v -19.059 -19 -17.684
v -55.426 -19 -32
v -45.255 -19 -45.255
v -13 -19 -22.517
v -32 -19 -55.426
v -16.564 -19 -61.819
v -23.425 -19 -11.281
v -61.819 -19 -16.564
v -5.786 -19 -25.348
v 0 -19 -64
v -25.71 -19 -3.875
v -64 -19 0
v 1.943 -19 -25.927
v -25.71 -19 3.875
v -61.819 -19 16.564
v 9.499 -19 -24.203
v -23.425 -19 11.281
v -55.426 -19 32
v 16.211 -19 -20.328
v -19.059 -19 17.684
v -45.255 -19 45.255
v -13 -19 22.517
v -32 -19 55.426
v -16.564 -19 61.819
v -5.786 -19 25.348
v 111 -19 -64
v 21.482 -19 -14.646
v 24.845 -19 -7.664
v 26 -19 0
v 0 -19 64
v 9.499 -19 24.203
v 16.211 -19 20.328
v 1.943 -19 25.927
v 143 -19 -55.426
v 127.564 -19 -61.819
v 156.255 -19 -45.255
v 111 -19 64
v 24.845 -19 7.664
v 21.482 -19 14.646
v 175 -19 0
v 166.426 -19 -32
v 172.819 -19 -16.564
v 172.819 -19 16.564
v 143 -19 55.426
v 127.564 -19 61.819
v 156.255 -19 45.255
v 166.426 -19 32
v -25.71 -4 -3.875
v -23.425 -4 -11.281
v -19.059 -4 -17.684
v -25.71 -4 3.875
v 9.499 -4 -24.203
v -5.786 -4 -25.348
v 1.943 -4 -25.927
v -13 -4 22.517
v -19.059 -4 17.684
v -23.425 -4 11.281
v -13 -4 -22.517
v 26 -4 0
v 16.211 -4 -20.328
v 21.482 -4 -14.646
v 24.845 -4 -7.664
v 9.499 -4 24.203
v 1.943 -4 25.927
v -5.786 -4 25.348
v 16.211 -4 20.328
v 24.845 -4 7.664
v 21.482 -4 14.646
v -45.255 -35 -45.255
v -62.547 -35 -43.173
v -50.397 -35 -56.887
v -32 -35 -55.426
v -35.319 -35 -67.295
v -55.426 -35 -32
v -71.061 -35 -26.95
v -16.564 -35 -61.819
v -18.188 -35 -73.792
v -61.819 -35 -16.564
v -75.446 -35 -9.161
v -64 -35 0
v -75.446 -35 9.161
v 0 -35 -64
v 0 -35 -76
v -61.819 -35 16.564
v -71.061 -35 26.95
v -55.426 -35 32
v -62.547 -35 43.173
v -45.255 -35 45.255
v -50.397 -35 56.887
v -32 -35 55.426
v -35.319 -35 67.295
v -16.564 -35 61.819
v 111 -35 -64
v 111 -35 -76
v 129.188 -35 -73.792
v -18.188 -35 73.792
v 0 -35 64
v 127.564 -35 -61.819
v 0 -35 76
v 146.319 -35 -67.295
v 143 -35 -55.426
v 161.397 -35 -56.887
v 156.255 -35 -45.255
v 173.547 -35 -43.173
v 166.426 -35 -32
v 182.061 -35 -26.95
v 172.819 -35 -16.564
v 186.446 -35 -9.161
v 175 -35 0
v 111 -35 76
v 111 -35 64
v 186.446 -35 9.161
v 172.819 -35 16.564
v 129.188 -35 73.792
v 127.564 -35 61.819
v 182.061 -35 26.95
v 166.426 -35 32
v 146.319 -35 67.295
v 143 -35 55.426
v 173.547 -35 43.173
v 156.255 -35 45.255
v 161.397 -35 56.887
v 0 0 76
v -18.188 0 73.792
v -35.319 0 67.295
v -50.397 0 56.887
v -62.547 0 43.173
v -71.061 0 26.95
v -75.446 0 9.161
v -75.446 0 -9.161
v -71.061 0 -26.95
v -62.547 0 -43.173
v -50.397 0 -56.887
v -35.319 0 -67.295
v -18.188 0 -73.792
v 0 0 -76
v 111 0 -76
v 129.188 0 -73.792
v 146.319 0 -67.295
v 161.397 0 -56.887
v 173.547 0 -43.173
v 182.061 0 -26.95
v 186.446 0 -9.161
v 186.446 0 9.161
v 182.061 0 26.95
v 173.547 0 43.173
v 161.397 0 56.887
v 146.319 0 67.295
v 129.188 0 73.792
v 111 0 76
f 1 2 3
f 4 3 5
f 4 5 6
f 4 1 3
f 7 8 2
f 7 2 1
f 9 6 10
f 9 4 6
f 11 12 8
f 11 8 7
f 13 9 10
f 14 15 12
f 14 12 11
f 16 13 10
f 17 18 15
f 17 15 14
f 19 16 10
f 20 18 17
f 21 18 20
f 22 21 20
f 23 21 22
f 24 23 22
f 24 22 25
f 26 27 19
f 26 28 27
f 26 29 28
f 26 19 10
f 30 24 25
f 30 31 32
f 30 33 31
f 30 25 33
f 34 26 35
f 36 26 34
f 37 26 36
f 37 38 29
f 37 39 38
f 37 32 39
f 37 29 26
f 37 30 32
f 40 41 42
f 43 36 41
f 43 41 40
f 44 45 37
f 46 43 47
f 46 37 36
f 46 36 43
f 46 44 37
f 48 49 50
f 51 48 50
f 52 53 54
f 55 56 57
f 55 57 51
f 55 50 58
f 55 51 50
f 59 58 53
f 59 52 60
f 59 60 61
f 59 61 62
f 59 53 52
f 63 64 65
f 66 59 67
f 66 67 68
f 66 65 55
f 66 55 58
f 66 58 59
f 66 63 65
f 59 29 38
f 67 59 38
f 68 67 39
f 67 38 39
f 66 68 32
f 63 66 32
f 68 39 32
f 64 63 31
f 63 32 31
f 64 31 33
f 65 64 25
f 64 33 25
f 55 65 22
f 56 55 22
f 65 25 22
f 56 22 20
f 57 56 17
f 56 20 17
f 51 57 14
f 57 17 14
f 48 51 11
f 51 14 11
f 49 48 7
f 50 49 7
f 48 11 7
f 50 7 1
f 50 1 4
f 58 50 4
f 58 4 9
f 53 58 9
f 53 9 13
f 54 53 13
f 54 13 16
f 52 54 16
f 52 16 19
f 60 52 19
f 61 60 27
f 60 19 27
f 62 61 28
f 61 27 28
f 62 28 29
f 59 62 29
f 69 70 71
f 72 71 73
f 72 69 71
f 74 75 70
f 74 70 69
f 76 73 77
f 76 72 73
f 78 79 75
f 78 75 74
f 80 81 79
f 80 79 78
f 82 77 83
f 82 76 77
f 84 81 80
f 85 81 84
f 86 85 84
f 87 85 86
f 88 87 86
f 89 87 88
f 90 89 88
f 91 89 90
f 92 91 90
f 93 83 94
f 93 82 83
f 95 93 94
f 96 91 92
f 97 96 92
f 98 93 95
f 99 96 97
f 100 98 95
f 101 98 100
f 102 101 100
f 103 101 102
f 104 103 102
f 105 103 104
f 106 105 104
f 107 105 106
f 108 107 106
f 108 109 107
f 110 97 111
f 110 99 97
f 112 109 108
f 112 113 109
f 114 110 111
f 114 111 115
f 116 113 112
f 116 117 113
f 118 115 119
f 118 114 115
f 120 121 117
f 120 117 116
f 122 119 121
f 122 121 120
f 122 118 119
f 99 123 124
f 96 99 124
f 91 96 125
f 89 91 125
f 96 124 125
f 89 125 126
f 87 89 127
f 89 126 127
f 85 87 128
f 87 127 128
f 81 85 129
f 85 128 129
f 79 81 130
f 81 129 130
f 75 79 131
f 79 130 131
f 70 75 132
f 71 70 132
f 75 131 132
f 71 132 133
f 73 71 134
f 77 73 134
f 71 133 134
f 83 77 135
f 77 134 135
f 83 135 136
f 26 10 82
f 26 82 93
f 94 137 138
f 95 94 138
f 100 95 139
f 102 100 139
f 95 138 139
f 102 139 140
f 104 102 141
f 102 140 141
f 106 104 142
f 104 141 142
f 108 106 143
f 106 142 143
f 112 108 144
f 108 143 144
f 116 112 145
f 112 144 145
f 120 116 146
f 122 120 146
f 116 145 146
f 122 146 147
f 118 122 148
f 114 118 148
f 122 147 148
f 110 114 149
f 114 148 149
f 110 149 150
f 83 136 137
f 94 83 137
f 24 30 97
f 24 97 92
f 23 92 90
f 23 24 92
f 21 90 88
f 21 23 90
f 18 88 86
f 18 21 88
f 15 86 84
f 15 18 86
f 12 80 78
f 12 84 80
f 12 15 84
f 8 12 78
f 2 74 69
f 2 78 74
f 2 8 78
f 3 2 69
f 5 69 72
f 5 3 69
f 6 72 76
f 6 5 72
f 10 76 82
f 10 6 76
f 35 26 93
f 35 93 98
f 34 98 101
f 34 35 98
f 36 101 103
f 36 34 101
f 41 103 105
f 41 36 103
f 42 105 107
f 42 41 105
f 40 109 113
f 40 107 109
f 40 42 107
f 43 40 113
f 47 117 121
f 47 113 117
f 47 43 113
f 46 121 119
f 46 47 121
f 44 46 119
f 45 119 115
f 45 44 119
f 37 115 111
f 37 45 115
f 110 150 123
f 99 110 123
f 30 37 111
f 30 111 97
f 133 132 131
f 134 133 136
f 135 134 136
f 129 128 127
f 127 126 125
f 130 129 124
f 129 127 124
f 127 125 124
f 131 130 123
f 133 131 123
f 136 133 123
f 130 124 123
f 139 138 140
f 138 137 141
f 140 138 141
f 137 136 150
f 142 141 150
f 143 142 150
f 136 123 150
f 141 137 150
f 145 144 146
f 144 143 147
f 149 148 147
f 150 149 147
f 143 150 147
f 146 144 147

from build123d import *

# Parameters (mm, degrees)
F1_DEPTH = 35
F4_DEPTH = 19
F5_R     = 26
F6_DEPTH = 15


with BuildPart() as f1:
    # F0 (on Front) → F1 (new body)
    with BuildSketch(Plane.XZ):
        with BuildLine():
            Line((111, 76), (0, 76))
            ThreePointArc((0, 76), (-76, 0), (0, -76))
            Line((0, -76), (111, -76))
            ThreePointArc((111, -76), (187, 0), (111, 76))
        make_face()
    extrude(amount=F1_DEPTH)

    # F3 (on offset) → F4 (cut)
    with BuildSketch(Plane.XZ.offset(19)):
        with BuildLine():
            Line((111, 64), (0, 64))
            ThreePointArc((0, 64), (-64, 0), (0, -64))
            Line((0, -64), (111, -64))
            ThreePointArc((111, -64), (175, 0), (111, 64))
        make_face()
    extrude(amount=F4_DEPTH, mode=Mode.SUBTRACT)

    # F5 (on offset) → F6 (cut)
    with BuildSketch(Plane.XZ.offset(19)):
        Circle(F5_R)
    extrude(amount=-F6_DEPTH, mode=Mode.SUBTRACT)


solid = f1.part
